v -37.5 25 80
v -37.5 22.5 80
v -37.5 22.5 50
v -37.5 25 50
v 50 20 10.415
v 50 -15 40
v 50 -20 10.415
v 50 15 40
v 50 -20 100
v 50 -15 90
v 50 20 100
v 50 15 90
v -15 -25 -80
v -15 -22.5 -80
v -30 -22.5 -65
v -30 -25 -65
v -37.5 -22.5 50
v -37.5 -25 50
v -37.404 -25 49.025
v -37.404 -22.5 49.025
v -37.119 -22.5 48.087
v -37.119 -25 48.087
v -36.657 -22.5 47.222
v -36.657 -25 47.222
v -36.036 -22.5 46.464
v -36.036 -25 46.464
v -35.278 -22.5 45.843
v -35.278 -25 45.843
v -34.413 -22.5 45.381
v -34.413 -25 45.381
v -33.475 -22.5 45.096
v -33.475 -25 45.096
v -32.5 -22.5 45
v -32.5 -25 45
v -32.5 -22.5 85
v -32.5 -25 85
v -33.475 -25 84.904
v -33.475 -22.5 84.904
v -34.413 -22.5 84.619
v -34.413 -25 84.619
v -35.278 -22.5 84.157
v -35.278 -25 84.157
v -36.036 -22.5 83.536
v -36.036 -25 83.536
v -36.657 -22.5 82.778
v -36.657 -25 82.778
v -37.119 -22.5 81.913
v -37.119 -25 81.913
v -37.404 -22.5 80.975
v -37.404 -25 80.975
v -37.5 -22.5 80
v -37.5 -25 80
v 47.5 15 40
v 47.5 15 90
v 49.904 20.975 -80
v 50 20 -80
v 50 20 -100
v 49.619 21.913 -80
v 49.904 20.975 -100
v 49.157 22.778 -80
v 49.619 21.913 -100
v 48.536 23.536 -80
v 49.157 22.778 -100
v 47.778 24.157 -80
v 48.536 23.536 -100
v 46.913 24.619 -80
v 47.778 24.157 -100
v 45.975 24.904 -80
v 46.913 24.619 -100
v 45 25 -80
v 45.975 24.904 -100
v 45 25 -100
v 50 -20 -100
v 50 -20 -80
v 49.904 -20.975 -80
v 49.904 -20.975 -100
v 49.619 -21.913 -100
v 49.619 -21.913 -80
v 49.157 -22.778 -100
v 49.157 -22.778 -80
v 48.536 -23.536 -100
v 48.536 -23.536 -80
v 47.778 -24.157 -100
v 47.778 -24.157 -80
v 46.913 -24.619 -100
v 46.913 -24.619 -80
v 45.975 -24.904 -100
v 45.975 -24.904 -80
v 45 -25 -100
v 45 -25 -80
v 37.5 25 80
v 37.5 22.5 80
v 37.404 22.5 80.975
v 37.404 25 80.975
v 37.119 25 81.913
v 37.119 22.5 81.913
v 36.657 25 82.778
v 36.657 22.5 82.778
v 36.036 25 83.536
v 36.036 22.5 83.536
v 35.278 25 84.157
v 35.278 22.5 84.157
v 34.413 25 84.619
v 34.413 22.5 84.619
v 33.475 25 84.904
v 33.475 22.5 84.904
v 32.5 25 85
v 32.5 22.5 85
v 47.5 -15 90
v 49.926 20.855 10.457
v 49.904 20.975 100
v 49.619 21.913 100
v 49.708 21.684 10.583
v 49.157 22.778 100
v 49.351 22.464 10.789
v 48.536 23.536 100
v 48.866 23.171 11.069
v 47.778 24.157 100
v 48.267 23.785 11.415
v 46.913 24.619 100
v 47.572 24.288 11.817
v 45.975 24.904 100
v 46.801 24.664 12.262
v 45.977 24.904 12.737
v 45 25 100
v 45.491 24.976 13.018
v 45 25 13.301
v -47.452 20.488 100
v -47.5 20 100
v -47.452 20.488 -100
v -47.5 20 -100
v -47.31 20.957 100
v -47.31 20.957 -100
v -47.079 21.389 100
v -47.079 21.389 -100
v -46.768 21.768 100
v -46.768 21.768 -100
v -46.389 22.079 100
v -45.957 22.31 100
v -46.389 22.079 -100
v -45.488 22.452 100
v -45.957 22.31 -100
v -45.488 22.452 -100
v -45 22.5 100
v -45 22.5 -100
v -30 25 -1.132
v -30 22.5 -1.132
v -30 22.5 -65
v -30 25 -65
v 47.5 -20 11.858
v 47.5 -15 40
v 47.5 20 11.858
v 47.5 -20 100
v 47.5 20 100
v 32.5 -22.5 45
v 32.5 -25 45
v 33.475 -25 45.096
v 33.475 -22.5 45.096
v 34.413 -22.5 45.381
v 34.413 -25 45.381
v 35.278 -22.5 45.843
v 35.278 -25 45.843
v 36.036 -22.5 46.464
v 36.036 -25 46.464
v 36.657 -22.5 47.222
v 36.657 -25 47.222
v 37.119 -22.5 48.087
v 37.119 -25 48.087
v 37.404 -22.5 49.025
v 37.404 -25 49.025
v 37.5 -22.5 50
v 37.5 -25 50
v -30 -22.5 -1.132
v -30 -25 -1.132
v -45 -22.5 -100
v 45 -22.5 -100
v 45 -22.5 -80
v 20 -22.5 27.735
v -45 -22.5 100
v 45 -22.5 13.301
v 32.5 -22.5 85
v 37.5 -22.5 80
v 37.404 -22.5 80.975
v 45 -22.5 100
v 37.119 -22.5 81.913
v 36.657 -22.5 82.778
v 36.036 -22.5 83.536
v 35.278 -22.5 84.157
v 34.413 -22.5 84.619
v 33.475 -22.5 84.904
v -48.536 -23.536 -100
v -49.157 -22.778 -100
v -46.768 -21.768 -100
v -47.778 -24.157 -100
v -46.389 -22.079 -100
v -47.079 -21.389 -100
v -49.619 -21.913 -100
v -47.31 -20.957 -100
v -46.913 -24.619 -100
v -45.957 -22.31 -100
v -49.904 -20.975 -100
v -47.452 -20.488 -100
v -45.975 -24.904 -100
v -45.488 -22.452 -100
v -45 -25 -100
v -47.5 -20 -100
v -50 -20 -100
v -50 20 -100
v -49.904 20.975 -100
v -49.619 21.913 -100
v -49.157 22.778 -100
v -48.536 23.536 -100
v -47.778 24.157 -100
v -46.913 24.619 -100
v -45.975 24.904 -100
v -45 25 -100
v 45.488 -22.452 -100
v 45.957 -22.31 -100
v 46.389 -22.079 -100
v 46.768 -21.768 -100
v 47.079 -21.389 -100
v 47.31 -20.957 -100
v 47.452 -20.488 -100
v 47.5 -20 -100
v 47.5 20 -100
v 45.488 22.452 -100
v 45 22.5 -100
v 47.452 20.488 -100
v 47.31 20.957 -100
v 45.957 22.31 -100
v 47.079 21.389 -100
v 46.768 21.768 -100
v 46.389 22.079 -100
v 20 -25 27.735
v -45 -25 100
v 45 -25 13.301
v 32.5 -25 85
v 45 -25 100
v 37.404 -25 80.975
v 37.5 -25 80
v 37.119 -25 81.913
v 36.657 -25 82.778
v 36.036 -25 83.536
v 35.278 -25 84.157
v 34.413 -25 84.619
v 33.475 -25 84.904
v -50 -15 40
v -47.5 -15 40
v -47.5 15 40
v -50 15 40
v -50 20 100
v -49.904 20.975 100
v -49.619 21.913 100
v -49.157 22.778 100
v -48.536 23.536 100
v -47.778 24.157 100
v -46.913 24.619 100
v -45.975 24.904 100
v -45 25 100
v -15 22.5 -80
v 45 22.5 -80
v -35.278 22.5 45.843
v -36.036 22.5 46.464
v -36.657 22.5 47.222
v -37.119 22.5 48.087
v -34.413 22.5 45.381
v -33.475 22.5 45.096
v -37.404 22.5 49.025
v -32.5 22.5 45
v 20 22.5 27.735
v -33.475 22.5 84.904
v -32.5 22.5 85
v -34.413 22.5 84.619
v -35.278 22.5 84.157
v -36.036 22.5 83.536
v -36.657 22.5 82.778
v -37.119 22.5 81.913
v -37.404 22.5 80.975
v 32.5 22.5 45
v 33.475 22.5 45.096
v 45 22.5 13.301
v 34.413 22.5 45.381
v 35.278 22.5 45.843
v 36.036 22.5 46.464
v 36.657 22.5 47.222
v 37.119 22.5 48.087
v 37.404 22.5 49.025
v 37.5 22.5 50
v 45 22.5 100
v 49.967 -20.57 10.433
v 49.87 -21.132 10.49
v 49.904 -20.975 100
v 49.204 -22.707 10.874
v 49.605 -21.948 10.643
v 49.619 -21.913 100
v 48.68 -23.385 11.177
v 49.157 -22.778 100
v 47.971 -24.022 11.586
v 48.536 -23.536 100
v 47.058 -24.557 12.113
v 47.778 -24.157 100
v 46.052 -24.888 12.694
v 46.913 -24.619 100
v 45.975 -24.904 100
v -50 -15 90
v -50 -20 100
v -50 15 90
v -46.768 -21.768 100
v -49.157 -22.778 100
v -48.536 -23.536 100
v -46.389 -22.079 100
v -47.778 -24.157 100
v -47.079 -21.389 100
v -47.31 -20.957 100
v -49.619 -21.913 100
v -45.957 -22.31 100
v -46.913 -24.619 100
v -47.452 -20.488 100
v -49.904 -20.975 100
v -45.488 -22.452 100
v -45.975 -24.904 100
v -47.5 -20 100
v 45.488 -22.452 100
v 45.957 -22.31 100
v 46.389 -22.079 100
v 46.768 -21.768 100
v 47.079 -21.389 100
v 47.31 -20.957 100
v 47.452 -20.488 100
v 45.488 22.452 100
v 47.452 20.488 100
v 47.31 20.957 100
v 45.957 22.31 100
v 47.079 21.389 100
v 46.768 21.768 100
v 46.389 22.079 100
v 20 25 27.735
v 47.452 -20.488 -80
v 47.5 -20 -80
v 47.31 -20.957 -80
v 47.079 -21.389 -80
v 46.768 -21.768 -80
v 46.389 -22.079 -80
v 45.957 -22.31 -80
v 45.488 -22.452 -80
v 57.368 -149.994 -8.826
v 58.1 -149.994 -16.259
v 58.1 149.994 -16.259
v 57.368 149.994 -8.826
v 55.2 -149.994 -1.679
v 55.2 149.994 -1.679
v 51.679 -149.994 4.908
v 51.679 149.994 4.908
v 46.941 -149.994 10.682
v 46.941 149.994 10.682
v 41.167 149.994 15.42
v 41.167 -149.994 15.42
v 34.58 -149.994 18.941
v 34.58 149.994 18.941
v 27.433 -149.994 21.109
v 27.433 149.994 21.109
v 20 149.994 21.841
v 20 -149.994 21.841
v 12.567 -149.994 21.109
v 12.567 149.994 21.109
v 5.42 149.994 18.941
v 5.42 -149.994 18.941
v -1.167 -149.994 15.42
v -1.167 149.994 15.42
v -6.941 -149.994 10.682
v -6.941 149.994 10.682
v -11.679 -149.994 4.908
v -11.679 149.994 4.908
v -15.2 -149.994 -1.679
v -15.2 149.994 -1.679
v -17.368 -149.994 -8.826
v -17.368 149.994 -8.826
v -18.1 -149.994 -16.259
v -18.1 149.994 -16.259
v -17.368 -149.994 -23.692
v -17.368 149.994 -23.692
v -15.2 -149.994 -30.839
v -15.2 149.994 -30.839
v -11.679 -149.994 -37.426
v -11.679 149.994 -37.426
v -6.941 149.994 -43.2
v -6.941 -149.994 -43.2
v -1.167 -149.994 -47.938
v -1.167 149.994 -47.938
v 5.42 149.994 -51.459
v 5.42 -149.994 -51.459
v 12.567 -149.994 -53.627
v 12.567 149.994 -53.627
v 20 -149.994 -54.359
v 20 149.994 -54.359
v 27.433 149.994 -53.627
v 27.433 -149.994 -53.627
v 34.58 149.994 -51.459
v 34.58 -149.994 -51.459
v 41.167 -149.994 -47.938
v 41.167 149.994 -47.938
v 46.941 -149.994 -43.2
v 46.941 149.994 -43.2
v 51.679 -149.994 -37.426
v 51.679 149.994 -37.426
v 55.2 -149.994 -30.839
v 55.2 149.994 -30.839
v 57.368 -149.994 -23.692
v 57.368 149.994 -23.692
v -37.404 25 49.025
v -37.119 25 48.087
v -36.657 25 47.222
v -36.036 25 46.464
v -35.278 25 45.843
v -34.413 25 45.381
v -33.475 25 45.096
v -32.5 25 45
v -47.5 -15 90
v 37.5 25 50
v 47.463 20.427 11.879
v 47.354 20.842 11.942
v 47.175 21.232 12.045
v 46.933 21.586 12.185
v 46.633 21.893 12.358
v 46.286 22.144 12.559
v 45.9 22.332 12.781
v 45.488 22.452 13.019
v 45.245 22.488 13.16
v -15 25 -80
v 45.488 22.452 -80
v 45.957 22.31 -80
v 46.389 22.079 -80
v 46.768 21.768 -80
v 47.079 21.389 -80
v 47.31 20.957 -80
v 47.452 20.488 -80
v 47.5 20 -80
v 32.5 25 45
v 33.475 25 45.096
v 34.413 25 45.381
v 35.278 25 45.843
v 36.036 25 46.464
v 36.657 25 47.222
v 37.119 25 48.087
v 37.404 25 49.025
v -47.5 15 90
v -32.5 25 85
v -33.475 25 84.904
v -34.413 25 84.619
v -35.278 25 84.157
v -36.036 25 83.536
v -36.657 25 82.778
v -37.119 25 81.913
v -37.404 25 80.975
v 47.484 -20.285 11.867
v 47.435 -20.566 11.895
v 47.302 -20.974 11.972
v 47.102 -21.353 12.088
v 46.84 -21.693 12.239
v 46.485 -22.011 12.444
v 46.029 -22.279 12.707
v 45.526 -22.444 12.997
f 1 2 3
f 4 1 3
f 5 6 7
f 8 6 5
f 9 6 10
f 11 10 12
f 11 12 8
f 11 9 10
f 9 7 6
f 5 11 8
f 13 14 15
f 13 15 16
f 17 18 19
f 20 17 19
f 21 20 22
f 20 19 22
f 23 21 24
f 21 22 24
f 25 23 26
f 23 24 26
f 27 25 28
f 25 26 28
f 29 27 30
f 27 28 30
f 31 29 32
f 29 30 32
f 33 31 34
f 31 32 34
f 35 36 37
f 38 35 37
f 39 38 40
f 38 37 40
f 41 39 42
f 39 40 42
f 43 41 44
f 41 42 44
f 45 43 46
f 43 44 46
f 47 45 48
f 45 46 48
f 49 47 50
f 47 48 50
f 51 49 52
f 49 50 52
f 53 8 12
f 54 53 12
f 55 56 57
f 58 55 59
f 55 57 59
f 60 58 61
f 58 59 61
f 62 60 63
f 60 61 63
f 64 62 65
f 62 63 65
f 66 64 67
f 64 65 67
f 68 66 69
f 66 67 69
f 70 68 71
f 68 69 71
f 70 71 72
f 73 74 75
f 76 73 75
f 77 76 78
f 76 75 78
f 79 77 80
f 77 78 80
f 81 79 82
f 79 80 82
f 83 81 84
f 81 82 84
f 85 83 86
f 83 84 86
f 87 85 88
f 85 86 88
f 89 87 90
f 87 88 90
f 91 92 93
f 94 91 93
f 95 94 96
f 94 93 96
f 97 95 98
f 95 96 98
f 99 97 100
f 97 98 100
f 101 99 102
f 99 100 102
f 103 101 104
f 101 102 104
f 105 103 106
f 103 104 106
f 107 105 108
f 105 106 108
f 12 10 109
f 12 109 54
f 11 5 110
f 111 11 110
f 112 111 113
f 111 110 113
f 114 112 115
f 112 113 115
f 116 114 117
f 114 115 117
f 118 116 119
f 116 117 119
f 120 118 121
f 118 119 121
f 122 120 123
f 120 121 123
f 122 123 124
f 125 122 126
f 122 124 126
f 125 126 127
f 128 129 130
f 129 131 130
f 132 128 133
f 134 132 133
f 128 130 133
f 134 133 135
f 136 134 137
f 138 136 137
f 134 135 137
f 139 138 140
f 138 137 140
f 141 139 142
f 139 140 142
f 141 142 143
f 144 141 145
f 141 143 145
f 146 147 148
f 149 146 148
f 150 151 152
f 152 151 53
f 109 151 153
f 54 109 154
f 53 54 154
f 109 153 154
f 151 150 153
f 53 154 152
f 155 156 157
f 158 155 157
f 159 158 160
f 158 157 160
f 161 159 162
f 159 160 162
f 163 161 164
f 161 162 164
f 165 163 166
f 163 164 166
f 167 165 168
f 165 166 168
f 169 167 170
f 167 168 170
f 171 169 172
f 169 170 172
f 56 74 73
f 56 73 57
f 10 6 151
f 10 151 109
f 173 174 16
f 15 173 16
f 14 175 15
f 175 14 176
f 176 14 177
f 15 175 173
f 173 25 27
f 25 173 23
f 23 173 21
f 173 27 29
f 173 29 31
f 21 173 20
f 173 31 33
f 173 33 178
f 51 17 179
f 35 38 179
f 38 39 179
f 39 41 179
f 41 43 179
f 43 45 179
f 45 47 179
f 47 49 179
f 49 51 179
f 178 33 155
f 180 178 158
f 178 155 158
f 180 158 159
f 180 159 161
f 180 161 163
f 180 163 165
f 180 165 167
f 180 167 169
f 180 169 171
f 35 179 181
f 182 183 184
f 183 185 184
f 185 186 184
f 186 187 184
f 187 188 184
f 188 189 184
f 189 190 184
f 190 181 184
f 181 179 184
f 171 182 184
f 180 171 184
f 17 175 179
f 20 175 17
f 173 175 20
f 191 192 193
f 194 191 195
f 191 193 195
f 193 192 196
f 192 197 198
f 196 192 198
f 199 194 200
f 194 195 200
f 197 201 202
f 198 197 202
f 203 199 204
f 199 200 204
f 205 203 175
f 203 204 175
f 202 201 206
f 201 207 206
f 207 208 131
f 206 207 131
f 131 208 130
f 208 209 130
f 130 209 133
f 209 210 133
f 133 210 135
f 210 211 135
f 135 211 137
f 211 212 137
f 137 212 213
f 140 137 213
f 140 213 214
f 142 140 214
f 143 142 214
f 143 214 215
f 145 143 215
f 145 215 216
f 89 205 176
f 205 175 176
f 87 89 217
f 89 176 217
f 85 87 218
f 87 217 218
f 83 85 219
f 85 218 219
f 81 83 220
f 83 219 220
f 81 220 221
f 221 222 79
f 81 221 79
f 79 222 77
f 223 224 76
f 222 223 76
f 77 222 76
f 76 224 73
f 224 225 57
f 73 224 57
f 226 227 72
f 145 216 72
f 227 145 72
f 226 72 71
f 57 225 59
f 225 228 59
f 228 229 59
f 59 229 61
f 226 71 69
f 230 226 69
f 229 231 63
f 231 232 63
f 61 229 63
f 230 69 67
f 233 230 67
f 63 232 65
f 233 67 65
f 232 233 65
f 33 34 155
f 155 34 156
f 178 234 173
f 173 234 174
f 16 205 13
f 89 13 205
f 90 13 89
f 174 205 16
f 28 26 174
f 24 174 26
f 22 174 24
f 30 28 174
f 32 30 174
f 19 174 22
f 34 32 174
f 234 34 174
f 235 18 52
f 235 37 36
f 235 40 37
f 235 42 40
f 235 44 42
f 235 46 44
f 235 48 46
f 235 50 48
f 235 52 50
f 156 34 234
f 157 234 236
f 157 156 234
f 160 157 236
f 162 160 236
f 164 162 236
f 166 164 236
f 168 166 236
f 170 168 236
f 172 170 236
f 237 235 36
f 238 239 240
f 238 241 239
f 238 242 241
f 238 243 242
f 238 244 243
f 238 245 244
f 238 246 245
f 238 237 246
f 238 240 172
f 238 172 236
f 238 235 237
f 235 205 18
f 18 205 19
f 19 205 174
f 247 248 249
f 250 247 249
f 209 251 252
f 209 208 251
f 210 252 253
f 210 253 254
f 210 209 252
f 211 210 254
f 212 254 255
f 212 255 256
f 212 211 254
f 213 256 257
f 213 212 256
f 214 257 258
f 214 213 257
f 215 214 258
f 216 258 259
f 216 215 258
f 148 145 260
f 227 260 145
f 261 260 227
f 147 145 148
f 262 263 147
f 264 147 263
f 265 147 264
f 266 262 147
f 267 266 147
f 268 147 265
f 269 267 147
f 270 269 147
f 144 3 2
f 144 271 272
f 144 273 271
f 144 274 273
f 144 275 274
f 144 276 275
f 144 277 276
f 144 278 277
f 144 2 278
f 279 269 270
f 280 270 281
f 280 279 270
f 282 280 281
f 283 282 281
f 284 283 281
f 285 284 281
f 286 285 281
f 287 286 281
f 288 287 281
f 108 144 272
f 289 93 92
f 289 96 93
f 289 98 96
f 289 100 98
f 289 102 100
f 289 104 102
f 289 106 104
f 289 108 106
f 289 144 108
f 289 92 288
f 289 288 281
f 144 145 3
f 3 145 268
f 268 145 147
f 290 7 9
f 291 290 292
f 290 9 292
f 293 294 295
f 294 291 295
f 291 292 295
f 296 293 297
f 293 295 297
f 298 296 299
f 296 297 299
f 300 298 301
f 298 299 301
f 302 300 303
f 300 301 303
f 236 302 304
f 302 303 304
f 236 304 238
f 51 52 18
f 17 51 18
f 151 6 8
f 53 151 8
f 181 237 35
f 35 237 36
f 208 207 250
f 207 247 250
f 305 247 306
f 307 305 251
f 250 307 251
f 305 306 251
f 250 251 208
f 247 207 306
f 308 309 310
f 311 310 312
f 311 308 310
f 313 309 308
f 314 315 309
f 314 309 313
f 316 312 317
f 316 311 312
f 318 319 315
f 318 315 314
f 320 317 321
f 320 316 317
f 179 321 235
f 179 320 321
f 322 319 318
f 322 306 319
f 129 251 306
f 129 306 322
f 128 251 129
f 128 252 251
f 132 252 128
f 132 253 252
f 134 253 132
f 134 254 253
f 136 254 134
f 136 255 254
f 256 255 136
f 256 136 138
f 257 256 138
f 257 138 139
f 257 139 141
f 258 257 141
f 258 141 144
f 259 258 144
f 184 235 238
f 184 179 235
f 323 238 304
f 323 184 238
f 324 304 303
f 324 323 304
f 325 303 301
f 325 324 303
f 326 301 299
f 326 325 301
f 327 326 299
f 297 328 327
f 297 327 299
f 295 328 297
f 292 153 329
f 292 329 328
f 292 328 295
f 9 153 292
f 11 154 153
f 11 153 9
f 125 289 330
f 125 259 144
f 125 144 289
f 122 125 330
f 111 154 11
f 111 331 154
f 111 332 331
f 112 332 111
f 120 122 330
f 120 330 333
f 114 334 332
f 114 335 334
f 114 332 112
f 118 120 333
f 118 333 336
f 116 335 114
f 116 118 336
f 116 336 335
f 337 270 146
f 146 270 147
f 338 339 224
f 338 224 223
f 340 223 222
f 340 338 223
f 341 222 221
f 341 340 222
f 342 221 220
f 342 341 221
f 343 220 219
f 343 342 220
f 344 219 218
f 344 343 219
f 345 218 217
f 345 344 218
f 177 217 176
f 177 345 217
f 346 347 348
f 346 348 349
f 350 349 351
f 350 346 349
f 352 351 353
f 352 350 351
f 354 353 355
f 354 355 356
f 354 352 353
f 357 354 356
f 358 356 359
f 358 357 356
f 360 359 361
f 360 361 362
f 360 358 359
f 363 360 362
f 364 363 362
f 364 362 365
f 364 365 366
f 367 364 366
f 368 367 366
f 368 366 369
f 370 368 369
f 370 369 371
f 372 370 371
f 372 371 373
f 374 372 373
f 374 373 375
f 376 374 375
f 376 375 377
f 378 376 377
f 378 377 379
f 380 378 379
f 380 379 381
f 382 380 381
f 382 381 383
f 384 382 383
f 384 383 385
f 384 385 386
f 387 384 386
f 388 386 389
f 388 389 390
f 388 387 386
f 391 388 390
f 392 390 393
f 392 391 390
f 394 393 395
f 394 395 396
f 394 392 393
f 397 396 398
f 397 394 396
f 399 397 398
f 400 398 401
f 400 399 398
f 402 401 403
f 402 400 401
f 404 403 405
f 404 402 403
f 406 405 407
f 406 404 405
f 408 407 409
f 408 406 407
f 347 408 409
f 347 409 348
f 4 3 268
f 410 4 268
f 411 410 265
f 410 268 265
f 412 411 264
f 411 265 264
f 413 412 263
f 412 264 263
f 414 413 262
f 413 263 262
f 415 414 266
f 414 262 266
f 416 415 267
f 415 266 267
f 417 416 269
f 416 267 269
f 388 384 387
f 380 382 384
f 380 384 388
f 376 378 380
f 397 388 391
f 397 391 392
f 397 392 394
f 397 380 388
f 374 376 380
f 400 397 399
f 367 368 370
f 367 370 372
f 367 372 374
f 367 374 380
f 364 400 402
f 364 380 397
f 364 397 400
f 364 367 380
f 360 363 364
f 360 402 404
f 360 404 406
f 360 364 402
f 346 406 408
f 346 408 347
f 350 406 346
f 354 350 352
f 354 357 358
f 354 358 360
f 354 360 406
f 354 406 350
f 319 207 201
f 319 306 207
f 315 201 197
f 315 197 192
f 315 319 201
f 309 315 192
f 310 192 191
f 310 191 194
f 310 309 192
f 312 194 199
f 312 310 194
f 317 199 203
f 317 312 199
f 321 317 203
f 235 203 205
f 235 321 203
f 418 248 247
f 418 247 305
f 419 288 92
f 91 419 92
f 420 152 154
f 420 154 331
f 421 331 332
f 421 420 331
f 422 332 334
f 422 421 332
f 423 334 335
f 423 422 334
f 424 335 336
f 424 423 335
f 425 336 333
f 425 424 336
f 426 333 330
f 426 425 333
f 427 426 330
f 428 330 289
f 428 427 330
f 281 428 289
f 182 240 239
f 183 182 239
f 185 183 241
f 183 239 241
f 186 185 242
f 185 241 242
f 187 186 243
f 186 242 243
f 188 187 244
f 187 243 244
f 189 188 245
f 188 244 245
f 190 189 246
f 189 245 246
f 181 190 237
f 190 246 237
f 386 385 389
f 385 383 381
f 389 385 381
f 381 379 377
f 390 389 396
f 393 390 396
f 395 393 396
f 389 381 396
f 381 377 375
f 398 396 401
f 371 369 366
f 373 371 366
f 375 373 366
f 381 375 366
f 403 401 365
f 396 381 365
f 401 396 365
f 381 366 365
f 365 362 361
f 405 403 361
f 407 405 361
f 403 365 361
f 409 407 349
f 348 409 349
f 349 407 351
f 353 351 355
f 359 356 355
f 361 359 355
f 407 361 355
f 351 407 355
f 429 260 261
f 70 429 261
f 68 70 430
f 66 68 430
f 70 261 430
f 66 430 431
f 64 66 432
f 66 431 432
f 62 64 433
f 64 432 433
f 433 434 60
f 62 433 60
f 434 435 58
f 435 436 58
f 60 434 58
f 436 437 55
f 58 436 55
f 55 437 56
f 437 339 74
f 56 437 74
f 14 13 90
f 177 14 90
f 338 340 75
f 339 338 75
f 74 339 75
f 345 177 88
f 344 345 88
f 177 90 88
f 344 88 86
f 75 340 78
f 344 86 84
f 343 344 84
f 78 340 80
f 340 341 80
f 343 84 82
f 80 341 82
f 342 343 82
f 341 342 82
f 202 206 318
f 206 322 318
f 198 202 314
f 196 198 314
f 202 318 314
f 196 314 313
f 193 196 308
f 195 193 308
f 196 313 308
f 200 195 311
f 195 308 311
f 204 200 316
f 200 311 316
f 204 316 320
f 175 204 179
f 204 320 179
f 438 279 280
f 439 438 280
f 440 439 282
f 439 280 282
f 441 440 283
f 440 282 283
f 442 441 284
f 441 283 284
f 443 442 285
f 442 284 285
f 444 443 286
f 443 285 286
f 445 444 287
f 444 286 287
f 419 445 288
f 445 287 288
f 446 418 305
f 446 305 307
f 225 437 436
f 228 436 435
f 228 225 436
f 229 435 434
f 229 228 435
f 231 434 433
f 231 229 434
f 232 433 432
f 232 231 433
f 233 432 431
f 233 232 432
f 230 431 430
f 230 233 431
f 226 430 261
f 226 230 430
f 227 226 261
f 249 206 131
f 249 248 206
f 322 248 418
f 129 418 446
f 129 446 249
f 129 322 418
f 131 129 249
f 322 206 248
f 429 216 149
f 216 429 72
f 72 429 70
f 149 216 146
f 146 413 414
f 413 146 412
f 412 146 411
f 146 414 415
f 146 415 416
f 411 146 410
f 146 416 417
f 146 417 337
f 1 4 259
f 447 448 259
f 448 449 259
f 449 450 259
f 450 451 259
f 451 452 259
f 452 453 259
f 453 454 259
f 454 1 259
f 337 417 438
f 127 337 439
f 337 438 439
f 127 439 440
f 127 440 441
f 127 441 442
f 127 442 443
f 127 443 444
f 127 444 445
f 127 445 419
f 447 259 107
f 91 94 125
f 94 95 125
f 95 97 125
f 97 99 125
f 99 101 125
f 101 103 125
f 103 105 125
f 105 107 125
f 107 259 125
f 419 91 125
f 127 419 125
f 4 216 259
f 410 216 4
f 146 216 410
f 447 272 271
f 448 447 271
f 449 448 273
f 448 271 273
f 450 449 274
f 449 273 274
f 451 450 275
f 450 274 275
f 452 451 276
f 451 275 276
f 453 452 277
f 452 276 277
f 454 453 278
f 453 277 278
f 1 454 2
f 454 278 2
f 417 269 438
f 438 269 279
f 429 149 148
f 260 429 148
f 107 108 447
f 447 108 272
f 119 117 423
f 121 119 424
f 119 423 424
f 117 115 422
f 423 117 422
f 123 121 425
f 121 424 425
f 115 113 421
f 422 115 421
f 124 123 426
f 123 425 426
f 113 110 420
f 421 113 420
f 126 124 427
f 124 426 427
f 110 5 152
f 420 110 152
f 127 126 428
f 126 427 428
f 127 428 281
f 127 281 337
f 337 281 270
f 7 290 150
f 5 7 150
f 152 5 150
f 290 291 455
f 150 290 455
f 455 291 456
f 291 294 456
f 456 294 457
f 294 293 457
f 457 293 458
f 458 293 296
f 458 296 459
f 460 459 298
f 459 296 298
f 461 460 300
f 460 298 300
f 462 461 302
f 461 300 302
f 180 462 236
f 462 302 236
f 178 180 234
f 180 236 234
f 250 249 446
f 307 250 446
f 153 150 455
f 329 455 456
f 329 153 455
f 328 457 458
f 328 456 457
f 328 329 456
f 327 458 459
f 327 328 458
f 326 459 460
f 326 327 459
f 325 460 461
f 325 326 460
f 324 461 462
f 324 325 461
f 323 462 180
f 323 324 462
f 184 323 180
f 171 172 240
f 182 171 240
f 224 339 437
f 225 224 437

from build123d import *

# Parameters (mm, degrees)
F0_W       = 100
F0_H       = 50
F1_DEPTH   = 100
F2_R       = 5
F3_T       = -2.5
F4_W       = 30
F4_H       = 50
F5_DEPTH   = 110
F7_DEPTH   = 43.301695
F8_SIZE    = 15
F10_DEPTH  = 102.455856
F11_R      = 38.1
F12_DEPTH  = 149.993569
F12_FACE_R = 38.1
F13_DEPTH  = 40


with BuildPart() as f1:
    # F0 (on Top) → F1 (new body, symmetric)
    with BuildSketch(Plane.XY):
        Rectangle(F0_W, F0_H)
    extrude(amount=F1_DEPTH, both=True)

    # F2
    f2_edges = [f1.edges().sort_by_distance(p)[0] for p in [
        (-50, -25, 0),
        (-50, 25, 0),
        (50, -25, 0),
        (50, 25, 0),
    ]]
    fillet(f2_edges, radius=F2_R)

    # F3
    f3_openings = [f1.faces().sort_by_distance(p)[0] for p in [
        (0, 0, 100),
        (0, 0, -100),
    ]]
    offset(amount=F3_T, openings=f3_openings)

    # F4 (on Right) → F5 (cut, symmetric)
    with BuildSketch(Plane.YZ):
        with Locations((0, 65)):
            Rectangle(F4_W, F4_H)
    extrude(amount=F5_DEPTH, both=True, mode=Mode.SUBTRACT)

    # F6 (on Front) → F7 (cut, symmetric)
    with BuildSketch(Plane.XZ):
        Polygon((20, 27.735027), (-30, -1.132487), (-30, -80), (90.14177, -80), (90.14177, -12.761343), align=None)
    extrude(amount=F7_DEPTH, both=True, mode=Mode.SUBTRACT)

    # F8
    f8_edges = [f1.edges().sort_by_distance(p)[0] for p in [
        (-30, 23.75, -80),
        (-30, -23.75, -80),
    ]]
    chamfer(f8_edges, length=F8_SIZE)

    # F9 (on face) → F10 (cut)
    with BuildSketch(Plane.XZ.offset(25)):
        with BuildLine():
            ThreePointArc((37.5, 80), (36.035534, 83.535534), (32.5, 85))
            Line((32.5, 85), (-32.5, 85))
            ThreePointArc((-32.5, 85), (-36.035534, 83.535534), (-37.5, 80))
            Line((-37.5, 80), (-37.5, 50))
            ThreePointArc((-37.5, 50), (-36.035534, 46.464466), (-32.5, 45))
            Line((-32.5, 45), (32.5, 45))
            ThreePointArc((32.5, 45), (36.035534, 46.464466), (37.5, 50))
            Line((37.5, 50), (37.5, 80))
        make_face()
    extrude(amount=-F10_DEPTH, mode=Mode.SUBTRACT)


with BuildPart() as f12:
    # F11 (on face) → F12 (new body, symmetric)
    with BuildSketch(Plane.XZ):
        with Locations((20, -16.259064)):
            Circle(F11_R)
    extrude(amount=F12_DEPTH, both=True)

    # F12_face (on face) → F13 (join)
    with BuildSketch(Plane(origin=(20, -149.993569, -16.259064), x_dir=(1, 0, 0), z_dir=(0, -1, 0))):
        Circle(F12_FACE_R)
    extrude(amount=-F13_DEPTH)


solid = Compound([f1.part, f12.part])
